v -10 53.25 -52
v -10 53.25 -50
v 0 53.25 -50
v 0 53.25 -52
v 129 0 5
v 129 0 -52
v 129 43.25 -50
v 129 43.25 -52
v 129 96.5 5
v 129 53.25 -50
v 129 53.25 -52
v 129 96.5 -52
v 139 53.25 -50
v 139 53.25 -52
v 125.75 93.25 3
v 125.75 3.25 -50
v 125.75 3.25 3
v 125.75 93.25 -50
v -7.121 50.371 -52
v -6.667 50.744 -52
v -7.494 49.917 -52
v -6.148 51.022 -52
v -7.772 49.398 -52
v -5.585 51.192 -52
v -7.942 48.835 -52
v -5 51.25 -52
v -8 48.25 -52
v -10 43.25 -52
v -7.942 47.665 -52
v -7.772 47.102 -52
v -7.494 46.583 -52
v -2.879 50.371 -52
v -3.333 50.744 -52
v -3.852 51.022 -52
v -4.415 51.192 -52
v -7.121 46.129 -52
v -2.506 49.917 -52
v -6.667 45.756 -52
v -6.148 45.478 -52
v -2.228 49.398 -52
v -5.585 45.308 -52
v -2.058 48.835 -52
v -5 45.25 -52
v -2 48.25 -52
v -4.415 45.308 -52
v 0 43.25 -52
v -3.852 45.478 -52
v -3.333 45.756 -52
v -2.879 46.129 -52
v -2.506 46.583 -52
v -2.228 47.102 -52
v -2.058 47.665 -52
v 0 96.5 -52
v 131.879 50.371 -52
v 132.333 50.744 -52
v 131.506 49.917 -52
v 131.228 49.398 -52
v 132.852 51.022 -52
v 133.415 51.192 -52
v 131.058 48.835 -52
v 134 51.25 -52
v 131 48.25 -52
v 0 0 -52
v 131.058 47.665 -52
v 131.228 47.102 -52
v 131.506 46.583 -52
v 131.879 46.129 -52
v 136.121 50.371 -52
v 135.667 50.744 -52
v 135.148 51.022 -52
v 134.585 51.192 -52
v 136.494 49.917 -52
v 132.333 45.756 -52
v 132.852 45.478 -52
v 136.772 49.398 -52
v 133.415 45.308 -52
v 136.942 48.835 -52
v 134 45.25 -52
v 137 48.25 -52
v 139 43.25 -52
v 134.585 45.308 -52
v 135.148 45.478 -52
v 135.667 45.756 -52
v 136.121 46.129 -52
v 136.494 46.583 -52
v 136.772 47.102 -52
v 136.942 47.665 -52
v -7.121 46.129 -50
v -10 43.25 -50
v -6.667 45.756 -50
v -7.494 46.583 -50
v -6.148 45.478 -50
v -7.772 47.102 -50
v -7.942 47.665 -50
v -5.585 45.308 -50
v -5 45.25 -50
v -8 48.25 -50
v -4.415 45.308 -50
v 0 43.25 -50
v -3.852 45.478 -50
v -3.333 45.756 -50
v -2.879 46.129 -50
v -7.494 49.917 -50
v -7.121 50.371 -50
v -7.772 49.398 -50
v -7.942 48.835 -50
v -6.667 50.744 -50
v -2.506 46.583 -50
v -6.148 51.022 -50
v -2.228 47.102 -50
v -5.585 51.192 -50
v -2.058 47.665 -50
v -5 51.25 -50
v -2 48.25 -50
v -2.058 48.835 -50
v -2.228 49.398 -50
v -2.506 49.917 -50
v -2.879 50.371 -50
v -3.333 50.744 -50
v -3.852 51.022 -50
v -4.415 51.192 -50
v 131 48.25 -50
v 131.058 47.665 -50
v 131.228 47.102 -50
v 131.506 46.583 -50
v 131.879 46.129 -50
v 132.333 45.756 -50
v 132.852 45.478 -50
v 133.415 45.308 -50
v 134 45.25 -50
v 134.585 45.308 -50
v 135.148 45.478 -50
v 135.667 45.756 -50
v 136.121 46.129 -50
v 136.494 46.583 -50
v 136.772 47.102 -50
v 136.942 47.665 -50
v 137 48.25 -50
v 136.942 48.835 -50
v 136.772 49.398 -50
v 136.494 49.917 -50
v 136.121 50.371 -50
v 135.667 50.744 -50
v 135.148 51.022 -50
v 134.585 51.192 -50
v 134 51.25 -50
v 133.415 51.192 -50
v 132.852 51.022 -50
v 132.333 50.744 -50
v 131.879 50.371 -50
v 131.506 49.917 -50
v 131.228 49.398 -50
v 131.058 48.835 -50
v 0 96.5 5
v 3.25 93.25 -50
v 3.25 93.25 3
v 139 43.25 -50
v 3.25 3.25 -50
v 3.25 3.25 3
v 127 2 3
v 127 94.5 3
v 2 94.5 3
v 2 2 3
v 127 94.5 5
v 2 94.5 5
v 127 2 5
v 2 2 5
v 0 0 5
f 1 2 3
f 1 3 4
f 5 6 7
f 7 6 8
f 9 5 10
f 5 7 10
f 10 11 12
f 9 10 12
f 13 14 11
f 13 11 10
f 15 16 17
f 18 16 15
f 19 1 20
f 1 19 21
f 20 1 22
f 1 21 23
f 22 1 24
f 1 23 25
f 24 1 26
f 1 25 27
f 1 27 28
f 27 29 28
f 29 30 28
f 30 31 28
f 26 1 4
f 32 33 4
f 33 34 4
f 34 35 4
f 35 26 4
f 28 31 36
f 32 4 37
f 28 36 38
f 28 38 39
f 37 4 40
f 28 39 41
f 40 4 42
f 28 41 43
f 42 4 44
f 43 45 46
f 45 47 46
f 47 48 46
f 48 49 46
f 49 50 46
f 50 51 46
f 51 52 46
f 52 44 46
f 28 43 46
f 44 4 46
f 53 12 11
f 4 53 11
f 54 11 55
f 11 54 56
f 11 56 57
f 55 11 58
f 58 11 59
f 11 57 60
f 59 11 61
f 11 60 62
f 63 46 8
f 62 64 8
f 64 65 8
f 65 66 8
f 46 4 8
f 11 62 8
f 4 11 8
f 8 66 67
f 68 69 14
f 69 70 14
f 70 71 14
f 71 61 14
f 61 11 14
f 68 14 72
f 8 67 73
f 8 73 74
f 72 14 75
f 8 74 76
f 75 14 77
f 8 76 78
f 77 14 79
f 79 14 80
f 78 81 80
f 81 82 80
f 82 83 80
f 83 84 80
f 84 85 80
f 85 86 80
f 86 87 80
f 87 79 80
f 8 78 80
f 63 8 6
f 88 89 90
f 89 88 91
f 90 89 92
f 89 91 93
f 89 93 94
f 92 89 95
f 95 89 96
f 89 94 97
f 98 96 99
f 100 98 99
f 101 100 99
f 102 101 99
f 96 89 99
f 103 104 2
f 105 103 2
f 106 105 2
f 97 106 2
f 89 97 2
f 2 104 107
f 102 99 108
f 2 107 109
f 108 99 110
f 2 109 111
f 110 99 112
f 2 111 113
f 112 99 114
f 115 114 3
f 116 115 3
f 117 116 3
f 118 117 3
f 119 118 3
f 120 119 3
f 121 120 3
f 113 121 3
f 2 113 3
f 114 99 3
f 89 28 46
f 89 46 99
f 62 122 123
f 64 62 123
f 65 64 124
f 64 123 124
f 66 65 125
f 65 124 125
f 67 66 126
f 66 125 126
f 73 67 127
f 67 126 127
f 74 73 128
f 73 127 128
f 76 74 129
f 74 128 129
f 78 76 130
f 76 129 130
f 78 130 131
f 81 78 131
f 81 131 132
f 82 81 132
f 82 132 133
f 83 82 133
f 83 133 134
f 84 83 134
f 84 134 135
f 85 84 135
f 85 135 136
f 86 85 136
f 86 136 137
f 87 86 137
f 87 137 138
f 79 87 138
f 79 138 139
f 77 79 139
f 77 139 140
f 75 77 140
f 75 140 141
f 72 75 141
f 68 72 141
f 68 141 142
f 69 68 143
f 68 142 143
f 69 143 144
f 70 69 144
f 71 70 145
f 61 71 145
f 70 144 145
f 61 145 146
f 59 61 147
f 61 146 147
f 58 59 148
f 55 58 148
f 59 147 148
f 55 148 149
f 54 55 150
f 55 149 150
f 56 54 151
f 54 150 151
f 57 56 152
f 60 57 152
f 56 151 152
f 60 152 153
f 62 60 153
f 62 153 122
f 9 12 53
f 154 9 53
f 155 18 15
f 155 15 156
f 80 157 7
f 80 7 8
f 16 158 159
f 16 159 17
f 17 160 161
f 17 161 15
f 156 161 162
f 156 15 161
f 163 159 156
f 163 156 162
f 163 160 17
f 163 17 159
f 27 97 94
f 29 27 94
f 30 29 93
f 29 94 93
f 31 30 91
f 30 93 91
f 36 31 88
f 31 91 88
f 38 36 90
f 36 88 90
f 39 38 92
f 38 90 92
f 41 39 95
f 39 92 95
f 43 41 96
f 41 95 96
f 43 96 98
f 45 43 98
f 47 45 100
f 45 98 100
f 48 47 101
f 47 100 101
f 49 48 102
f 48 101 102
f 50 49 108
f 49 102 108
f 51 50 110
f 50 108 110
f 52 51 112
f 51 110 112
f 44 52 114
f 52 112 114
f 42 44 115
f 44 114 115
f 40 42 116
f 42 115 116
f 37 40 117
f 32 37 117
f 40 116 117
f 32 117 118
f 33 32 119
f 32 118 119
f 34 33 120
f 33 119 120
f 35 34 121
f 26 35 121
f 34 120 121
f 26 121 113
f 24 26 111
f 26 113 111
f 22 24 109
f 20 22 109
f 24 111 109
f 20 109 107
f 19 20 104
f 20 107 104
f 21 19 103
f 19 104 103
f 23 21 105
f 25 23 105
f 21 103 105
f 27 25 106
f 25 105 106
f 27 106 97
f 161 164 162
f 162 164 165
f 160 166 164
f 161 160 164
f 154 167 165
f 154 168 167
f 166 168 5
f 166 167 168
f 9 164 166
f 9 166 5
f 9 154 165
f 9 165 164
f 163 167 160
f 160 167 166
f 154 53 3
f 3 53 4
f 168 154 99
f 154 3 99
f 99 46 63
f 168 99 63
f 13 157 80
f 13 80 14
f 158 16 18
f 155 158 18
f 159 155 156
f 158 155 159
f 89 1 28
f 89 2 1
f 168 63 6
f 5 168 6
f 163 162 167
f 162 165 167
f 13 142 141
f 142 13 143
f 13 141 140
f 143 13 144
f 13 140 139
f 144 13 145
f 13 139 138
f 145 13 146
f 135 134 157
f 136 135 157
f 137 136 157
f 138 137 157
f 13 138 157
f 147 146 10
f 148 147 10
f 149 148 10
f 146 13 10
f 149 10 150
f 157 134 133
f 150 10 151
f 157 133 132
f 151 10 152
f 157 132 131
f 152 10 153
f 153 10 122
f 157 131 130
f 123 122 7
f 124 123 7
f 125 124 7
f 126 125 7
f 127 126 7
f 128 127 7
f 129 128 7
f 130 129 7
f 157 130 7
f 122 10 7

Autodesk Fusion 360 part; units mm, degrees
sketch "Sketch1" plane through (0, 0, 0) normal (0, 0, 1) x (1, 0, 0)
  line L0 (0, 0) -> (129, 0)
  line L1 (129, 0) -> (129, 96.5)
  line L2 (129, 96.5) -> (0, 96.5)
  line L3 (0, 96.5) -> (0, 0)
  line L4 (3.25, 3.25) -> (125.75, 3.25)
  line L5 (125.75, 3.25) -> (125.75, 93.25)
  line L6 (125.75, 93.25) -> (3.25, 93.25)
  line L7 (3.25, 93.25) -> (3.25, 3.25)
  dimension "d1" = 129
  dimension "d2" = 96.5
  dimension "d3" = 122.5
  dimension "d4" = 90
  dimension "d5" = 3.25
  dimension "d6" = 3.25
extrude "Extrude1" add sketch "Sketch1" along normal blind 5
sketch "Sketch2" plane through (0, 0, 5) normal (0, 0, 1) x (-1, 0, 0)
  line L0 (-3.25, -3.25) -> (-3.25, -93.25)
  line L1 (-3.25, -93.25) -> (-125.75, -93.25)
  line L2 (-125.75, -93.25) -> (-125.75, -3.25)
  line L3 (-125.75, -3.25) -> (-3.25, -3.25)
  line L4 (0, -96.5) -> (0, 0)
  line L5 (0, 0) -> (-129, 0)
  line L6 (-129, 0) -> (-129, -96.5)
  line L7 (-129, -96.5) -> (0, -96.5)
  line L8 (-2, -2) -> (-127, -2)
  line L9 (-127, -2) -> (-127, -94.5)
  line L10 (-127, -94.5) -> (-2, -94.5)
  line L11 (-2, -94.5) -> (-2, -2)
  dimension "d9" = 125
  dimension "d10" = 92.5
  dimension "d11" = 2
  dimension "d12" = 2
extrude "Extrude2" cut sketch "Sketch2" against normal blind 2 contours L8 L9 L10 L11
move_face "OffsetFaces1" offset 50 1 faces at (84.9167, 1.0833, 0)
sketch "Sketch4" plane through (129, 0, 0) normal (1, 0, 0) x (0, 1, 0)
  line L0 (0, -50) -> (96.5, -50)
  line L1 (96.5, -50) -> (96.5, 5)
  line L2 (96.5, 5) -> (0, 5)
  line L3 (0, 5) -> (0, -50)
  line L4 (0, -50) -> (96.5, -50)
  line L5 (96.5, -50) -> (96.5, -52)
  line L6 (96.5, -52) -> (0, -52)
  line L7 (0, -52) -> (0, -50)
  dimension "d18" = 96.5
  dimension "d19" = 2
extrude "Extrude3" add sketch "Sketch4" against normal blind 129 contours L0 L4 L5 L6 L7
sketch "Sketch5" plane through (129, 0, 0) normal (1, 0, 0) x (0, 1, 0)
  line L0 (96.5, -52) -> (96.5, 5)
  line L1 (96.5, 5) -> (0, 5)
  line L2 (0, 5) -> (0, -52)
  line L3 (0, -52) -> (96.5, -52)
  line L4 (43.25, -52) -> (53.25, -52)
  line L5 (53.25, -52) -> (53.25, -50)
  line L6 (53.25, -50) -> (43.25, -50)
  line L7 (43.25, -50) -> (43.25, -52)
  dimension "d22" = 10
  dimension "d23" = 2
  dimension "d24" = 43.25
sketch "Sketch6" plane through (0, 0, 0) normal (-1, 0, 0) x (0, -1, 0)
  line L0 (0, -52) -> (0, 5)
  line L1 (0, 5) -> (-96.5, 5)
  line L2 (-96.5, 5) -> (-96.5, -52)
  line L3 (-96.5, -52) -> (0, -52)
  line L4 (-53.25, -52) -> (-43.25, -52)
  line L5 (-43.25, -52) -> (-43.25, -50)
  line L6 (-43.25, -50) -> (-53.25, -50)
  line L7 (-53.25, -50) -> (-53.25, -52)
  dimension "d25" = 10
  dimension "d26" = 2
  dimension "d27" = 43.25
extrude "Extrude4" add sketch "Sketch6" along normal blind 10 contours L3 L4 L5 L6 L7
extrude "Extrude5" add sketch "Sketch5" along normal blind 10 contours L3 L4 L5 L6 L7
sketch "Sketch7" plane through (0, 0, -50) normal (0, 0, 1) x (-1, 0, 0)
  line L0 (0, -43.25) -> (0, -53.25)
  line L1 (0, -53.25) -> (10, -53.25)
  line L2 (10, -53.25) -> (10, -43.25)
  line L3 (10, -43.25) -> (0, -43.25)
  circle A0 centre (5, -48.25) radius 3
  dimension "d32" = 6
  dimension "d33" = 5
  dimension "d34" = 5
extrude "Extrude6" cut sketch "Sketch7" against normal blind 2 contours A0
sketch "Sketch8" plane through (0, 0, -50) normal (0, 0, 1) x (-1, 0, 0)
  line L0 (-129, -53.25) -> (-129, -43.25)
  line L1 (-129, -43.25) -> (-139, -43.25)
  line L2 (-139, -43.25) -> (-139, -53.25)
  line L3 (-139, -53.25) -> (-129, -53.25)
  circle A0 centre (-134, -48.25) radius 3
  dimension "d37" = 6
  dimension "d38" = 5
  dimension "d39" = 5
extrude "Extrude7" cut sketch "Sketch8" against normal blind 2 contours A0
